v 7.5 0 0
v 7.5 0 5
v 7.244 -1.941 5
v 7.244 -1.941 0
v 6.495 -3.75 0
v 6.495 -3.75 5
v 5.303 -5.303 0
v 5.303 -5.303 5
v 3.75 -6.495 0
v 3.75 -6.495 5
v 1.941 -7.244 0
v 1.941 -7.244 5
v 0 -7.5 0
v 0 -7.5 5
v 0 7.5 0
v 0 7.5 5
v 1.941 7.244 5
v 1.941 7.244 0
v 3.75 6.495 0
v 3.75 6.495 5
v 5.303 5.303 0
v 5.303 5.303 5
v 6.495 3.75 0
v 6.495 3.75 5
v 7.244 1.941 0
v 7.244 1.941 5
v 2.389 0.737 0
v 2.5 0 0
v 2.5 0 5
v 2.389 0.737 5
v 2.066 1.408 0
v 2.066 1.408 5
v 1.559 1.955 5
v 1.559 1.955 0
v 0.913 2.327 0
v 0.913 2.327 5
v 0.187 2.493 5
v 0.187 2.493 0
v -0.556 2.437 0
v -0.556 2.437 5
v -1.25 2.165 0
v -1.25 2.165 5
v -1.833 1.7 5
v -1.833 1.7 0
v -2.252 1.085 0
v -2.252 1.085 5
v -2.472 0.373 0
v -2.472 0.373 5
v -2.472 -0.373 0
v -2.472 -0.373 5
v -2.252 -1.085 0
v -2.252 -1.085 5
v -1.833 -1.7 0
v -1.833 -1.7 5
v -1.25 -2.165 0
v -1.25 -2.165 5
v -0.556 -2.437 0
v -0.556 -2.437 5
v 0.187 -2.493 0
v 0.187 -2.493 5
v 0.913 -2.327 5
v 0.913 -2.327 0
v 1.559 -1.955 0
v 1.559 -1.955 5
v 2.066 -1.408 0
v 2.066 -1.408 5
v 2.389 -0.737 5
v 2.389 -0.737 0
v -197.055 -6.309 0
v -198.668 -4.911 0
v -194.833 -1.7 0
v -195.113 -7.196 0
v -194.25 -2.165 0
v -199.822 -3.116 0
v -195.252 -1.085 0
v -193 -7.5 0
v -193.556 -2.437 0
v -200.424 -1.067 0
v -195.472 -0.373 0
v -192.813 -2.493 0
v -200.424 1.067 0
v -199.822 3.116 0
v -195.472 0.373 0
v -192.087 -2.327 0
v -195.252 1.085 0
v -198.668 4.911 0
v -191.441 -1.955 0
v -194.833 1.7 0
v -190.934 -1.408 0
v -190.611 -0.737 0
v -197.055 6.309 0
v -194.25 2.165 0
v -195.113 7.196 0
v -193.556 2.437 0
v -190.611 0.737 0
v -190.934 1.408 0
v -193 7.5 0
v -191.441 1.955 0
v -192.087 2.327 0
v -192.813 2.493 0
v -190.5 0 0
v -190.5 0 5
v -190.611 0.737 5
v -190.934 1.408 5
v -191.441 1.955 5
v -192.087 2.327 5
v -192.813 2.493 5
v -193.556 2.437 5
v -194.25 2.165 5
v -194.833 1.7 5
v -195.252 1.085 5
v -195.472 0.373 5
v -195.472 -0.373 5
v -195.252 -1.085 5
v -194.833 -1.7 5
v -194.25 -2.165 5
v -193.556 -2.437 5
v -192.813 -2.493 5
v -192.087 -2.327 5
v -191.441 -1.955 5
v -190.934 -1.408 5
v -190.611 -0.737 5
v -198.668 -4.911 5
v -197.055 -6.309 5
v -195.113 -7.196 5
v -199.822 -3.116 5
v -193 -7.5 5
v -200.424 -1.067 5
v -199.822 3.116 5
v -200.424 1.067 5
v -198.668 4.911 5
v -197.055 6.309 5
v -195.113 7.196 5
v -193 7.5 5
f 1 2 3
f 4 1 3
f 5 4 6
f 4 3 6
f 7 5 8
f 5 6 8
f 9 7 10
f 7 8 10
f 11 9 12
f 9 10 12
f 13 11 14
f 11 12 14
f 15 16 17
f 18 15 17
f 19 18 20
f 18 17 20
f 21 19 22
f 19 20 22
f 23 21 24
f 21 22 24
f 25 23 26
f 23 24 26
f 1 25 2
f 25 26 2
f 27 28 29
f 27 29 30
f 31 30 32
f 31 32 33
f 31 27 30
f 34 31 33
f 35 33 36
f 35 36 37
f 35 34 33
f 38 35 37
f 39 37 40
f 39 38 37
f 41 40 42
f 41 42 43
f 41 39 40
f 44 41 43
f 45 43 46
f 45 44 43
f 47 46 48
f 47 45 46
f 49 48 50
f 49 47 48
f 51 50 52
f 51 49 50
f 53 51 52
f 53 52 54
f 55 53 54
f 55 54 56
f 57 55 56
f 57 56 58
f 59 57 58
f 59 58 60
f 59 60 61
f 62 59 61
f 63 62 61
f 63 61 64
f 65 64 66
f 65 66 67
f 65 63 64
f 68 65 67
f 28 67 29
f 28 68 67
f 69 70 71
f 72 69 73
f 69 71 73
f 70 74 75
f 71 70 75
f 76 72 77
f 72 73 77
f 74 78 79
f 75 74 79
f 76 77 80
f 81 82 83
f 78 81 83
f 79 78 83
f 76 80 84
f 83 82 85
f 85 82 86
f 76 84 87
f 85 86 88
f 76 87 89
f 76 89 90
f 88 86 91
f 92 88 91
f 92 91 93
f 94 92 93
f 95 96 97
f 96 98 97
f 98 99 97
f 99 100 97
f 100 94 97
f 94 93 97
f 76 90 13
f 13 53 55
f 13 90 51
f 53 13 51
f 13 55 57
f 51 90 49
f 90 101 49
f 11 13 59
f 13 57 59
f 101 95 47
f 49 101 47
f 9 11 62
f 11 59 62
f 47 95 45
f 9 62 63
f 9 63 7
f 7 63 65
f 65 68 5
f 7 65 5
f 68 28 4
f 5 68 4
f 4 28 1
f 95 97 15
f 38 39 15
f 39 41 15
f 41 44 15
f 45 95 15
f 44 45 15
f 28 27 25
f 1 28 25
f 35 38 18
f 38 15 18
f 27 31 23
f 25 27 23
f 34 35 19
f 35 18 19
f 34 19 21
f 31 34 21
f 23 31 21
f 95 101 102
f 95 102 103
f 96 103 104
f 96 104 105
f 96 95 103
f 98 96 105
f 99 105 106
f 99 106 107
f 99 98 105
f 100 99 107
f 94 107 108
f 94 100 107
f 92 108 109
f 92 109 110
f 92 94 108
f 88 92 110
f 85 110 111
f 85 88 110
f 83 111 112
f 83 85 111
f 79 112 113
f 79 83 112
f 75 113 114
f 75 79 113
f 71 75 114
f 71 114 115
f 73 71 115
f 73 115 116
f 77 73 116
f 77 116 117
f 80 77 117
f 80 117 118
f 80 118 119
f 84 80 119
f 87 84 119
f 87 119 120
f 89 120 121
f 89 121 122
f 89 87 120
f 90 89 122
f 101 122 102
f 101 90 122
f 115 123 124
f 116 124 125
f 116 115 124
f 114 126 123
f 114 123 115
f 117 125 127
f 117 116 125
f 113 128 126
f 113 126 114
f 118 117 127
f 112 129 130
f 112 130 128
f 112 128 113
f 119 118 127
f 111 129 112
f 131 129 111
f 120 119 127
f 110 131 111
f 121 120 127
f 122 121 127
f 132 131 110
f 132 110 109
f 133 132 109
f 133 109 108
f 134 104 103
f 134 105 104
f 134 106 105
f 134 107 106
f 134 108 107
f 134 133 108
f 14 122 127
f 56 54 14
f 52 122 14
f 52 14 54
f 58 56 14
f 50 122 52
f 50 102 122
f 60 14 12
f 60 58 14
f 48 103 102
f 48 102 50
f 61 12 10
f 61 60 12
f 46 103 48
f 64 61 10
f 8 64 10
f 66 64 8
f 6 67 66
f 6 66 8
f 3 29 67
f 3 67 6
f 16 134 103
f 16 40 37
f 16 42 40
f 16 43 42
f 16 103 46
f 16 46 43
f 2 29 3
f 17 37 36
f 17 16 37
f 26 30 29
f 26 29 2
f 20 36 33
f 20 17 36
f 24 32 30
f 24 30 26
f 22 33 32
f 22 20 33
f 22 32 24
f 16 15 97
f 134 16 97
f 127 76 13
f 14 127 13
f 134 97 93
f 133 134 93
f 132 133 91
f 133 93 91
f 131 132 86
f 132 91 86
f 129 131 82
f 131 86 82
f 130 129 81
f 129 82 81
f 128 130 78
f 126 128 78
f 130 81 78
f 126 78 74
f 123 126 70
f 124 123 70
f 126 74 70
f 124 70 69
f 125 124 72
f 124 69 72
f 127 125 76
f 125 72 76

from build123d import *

# Parameters (mm, degrees)
F0_R     = 2.5
F1_DEPTH = 5
F2_R     = 2.5
F3_DEPTH = 25


with BuildPart() as f1:
    # F0 (on Top) → F1 (new body)
    with BuildSketch(Plane.XY):
        with BuildLine():
            ThreePointArc((193, -7.5), (200.5, 0), (193, 7.5))
            Line((193, 7.5), (-193, 7.5))
            ThreePointArc((-193, 7.5), (-200.5, 0), (-193, -7.5))
            Line((-193, -7.5), (193, -7.5))
        make_face()
        with Locations((-193, 0)):
            Circle(F0_R, mode=Mode.SUBTRACT)
        Circle(F0_R, mode=Mode.SUBTRACT)
        with Locations((193, 0)):
            Circle(F0_R, mode=Mode.SUBTRACT)
    extrude(amount=F1_DEPTH)

    # F2 (on face) → F3 (cut)
    with BuildSketch(Plane.XY.offset(5)):
        Circle(F2_R)
        with BuildLine():
            ThreePointArc((0, 7.5), (5.303301, 5.303301), (7.5, 0))
            ThreePointArc((7.5, 0), (5.303301, -5.303301), (0, -7.5))
            Line((0, -7.5), (193, -7.5))
            ThreePointArc((193, -7.5), (200.5, 0), (193, 7.5))
            Line((193, 7.5), (0, 7.5))
        make_face()
        with Locations((193, 0)):
            Circle(F2_R, mode=Mode.SUBTRACT)
    extrude(amount=-F3_DEPTH, mode=Mode.SUBTRACT)


solid = f1.part
